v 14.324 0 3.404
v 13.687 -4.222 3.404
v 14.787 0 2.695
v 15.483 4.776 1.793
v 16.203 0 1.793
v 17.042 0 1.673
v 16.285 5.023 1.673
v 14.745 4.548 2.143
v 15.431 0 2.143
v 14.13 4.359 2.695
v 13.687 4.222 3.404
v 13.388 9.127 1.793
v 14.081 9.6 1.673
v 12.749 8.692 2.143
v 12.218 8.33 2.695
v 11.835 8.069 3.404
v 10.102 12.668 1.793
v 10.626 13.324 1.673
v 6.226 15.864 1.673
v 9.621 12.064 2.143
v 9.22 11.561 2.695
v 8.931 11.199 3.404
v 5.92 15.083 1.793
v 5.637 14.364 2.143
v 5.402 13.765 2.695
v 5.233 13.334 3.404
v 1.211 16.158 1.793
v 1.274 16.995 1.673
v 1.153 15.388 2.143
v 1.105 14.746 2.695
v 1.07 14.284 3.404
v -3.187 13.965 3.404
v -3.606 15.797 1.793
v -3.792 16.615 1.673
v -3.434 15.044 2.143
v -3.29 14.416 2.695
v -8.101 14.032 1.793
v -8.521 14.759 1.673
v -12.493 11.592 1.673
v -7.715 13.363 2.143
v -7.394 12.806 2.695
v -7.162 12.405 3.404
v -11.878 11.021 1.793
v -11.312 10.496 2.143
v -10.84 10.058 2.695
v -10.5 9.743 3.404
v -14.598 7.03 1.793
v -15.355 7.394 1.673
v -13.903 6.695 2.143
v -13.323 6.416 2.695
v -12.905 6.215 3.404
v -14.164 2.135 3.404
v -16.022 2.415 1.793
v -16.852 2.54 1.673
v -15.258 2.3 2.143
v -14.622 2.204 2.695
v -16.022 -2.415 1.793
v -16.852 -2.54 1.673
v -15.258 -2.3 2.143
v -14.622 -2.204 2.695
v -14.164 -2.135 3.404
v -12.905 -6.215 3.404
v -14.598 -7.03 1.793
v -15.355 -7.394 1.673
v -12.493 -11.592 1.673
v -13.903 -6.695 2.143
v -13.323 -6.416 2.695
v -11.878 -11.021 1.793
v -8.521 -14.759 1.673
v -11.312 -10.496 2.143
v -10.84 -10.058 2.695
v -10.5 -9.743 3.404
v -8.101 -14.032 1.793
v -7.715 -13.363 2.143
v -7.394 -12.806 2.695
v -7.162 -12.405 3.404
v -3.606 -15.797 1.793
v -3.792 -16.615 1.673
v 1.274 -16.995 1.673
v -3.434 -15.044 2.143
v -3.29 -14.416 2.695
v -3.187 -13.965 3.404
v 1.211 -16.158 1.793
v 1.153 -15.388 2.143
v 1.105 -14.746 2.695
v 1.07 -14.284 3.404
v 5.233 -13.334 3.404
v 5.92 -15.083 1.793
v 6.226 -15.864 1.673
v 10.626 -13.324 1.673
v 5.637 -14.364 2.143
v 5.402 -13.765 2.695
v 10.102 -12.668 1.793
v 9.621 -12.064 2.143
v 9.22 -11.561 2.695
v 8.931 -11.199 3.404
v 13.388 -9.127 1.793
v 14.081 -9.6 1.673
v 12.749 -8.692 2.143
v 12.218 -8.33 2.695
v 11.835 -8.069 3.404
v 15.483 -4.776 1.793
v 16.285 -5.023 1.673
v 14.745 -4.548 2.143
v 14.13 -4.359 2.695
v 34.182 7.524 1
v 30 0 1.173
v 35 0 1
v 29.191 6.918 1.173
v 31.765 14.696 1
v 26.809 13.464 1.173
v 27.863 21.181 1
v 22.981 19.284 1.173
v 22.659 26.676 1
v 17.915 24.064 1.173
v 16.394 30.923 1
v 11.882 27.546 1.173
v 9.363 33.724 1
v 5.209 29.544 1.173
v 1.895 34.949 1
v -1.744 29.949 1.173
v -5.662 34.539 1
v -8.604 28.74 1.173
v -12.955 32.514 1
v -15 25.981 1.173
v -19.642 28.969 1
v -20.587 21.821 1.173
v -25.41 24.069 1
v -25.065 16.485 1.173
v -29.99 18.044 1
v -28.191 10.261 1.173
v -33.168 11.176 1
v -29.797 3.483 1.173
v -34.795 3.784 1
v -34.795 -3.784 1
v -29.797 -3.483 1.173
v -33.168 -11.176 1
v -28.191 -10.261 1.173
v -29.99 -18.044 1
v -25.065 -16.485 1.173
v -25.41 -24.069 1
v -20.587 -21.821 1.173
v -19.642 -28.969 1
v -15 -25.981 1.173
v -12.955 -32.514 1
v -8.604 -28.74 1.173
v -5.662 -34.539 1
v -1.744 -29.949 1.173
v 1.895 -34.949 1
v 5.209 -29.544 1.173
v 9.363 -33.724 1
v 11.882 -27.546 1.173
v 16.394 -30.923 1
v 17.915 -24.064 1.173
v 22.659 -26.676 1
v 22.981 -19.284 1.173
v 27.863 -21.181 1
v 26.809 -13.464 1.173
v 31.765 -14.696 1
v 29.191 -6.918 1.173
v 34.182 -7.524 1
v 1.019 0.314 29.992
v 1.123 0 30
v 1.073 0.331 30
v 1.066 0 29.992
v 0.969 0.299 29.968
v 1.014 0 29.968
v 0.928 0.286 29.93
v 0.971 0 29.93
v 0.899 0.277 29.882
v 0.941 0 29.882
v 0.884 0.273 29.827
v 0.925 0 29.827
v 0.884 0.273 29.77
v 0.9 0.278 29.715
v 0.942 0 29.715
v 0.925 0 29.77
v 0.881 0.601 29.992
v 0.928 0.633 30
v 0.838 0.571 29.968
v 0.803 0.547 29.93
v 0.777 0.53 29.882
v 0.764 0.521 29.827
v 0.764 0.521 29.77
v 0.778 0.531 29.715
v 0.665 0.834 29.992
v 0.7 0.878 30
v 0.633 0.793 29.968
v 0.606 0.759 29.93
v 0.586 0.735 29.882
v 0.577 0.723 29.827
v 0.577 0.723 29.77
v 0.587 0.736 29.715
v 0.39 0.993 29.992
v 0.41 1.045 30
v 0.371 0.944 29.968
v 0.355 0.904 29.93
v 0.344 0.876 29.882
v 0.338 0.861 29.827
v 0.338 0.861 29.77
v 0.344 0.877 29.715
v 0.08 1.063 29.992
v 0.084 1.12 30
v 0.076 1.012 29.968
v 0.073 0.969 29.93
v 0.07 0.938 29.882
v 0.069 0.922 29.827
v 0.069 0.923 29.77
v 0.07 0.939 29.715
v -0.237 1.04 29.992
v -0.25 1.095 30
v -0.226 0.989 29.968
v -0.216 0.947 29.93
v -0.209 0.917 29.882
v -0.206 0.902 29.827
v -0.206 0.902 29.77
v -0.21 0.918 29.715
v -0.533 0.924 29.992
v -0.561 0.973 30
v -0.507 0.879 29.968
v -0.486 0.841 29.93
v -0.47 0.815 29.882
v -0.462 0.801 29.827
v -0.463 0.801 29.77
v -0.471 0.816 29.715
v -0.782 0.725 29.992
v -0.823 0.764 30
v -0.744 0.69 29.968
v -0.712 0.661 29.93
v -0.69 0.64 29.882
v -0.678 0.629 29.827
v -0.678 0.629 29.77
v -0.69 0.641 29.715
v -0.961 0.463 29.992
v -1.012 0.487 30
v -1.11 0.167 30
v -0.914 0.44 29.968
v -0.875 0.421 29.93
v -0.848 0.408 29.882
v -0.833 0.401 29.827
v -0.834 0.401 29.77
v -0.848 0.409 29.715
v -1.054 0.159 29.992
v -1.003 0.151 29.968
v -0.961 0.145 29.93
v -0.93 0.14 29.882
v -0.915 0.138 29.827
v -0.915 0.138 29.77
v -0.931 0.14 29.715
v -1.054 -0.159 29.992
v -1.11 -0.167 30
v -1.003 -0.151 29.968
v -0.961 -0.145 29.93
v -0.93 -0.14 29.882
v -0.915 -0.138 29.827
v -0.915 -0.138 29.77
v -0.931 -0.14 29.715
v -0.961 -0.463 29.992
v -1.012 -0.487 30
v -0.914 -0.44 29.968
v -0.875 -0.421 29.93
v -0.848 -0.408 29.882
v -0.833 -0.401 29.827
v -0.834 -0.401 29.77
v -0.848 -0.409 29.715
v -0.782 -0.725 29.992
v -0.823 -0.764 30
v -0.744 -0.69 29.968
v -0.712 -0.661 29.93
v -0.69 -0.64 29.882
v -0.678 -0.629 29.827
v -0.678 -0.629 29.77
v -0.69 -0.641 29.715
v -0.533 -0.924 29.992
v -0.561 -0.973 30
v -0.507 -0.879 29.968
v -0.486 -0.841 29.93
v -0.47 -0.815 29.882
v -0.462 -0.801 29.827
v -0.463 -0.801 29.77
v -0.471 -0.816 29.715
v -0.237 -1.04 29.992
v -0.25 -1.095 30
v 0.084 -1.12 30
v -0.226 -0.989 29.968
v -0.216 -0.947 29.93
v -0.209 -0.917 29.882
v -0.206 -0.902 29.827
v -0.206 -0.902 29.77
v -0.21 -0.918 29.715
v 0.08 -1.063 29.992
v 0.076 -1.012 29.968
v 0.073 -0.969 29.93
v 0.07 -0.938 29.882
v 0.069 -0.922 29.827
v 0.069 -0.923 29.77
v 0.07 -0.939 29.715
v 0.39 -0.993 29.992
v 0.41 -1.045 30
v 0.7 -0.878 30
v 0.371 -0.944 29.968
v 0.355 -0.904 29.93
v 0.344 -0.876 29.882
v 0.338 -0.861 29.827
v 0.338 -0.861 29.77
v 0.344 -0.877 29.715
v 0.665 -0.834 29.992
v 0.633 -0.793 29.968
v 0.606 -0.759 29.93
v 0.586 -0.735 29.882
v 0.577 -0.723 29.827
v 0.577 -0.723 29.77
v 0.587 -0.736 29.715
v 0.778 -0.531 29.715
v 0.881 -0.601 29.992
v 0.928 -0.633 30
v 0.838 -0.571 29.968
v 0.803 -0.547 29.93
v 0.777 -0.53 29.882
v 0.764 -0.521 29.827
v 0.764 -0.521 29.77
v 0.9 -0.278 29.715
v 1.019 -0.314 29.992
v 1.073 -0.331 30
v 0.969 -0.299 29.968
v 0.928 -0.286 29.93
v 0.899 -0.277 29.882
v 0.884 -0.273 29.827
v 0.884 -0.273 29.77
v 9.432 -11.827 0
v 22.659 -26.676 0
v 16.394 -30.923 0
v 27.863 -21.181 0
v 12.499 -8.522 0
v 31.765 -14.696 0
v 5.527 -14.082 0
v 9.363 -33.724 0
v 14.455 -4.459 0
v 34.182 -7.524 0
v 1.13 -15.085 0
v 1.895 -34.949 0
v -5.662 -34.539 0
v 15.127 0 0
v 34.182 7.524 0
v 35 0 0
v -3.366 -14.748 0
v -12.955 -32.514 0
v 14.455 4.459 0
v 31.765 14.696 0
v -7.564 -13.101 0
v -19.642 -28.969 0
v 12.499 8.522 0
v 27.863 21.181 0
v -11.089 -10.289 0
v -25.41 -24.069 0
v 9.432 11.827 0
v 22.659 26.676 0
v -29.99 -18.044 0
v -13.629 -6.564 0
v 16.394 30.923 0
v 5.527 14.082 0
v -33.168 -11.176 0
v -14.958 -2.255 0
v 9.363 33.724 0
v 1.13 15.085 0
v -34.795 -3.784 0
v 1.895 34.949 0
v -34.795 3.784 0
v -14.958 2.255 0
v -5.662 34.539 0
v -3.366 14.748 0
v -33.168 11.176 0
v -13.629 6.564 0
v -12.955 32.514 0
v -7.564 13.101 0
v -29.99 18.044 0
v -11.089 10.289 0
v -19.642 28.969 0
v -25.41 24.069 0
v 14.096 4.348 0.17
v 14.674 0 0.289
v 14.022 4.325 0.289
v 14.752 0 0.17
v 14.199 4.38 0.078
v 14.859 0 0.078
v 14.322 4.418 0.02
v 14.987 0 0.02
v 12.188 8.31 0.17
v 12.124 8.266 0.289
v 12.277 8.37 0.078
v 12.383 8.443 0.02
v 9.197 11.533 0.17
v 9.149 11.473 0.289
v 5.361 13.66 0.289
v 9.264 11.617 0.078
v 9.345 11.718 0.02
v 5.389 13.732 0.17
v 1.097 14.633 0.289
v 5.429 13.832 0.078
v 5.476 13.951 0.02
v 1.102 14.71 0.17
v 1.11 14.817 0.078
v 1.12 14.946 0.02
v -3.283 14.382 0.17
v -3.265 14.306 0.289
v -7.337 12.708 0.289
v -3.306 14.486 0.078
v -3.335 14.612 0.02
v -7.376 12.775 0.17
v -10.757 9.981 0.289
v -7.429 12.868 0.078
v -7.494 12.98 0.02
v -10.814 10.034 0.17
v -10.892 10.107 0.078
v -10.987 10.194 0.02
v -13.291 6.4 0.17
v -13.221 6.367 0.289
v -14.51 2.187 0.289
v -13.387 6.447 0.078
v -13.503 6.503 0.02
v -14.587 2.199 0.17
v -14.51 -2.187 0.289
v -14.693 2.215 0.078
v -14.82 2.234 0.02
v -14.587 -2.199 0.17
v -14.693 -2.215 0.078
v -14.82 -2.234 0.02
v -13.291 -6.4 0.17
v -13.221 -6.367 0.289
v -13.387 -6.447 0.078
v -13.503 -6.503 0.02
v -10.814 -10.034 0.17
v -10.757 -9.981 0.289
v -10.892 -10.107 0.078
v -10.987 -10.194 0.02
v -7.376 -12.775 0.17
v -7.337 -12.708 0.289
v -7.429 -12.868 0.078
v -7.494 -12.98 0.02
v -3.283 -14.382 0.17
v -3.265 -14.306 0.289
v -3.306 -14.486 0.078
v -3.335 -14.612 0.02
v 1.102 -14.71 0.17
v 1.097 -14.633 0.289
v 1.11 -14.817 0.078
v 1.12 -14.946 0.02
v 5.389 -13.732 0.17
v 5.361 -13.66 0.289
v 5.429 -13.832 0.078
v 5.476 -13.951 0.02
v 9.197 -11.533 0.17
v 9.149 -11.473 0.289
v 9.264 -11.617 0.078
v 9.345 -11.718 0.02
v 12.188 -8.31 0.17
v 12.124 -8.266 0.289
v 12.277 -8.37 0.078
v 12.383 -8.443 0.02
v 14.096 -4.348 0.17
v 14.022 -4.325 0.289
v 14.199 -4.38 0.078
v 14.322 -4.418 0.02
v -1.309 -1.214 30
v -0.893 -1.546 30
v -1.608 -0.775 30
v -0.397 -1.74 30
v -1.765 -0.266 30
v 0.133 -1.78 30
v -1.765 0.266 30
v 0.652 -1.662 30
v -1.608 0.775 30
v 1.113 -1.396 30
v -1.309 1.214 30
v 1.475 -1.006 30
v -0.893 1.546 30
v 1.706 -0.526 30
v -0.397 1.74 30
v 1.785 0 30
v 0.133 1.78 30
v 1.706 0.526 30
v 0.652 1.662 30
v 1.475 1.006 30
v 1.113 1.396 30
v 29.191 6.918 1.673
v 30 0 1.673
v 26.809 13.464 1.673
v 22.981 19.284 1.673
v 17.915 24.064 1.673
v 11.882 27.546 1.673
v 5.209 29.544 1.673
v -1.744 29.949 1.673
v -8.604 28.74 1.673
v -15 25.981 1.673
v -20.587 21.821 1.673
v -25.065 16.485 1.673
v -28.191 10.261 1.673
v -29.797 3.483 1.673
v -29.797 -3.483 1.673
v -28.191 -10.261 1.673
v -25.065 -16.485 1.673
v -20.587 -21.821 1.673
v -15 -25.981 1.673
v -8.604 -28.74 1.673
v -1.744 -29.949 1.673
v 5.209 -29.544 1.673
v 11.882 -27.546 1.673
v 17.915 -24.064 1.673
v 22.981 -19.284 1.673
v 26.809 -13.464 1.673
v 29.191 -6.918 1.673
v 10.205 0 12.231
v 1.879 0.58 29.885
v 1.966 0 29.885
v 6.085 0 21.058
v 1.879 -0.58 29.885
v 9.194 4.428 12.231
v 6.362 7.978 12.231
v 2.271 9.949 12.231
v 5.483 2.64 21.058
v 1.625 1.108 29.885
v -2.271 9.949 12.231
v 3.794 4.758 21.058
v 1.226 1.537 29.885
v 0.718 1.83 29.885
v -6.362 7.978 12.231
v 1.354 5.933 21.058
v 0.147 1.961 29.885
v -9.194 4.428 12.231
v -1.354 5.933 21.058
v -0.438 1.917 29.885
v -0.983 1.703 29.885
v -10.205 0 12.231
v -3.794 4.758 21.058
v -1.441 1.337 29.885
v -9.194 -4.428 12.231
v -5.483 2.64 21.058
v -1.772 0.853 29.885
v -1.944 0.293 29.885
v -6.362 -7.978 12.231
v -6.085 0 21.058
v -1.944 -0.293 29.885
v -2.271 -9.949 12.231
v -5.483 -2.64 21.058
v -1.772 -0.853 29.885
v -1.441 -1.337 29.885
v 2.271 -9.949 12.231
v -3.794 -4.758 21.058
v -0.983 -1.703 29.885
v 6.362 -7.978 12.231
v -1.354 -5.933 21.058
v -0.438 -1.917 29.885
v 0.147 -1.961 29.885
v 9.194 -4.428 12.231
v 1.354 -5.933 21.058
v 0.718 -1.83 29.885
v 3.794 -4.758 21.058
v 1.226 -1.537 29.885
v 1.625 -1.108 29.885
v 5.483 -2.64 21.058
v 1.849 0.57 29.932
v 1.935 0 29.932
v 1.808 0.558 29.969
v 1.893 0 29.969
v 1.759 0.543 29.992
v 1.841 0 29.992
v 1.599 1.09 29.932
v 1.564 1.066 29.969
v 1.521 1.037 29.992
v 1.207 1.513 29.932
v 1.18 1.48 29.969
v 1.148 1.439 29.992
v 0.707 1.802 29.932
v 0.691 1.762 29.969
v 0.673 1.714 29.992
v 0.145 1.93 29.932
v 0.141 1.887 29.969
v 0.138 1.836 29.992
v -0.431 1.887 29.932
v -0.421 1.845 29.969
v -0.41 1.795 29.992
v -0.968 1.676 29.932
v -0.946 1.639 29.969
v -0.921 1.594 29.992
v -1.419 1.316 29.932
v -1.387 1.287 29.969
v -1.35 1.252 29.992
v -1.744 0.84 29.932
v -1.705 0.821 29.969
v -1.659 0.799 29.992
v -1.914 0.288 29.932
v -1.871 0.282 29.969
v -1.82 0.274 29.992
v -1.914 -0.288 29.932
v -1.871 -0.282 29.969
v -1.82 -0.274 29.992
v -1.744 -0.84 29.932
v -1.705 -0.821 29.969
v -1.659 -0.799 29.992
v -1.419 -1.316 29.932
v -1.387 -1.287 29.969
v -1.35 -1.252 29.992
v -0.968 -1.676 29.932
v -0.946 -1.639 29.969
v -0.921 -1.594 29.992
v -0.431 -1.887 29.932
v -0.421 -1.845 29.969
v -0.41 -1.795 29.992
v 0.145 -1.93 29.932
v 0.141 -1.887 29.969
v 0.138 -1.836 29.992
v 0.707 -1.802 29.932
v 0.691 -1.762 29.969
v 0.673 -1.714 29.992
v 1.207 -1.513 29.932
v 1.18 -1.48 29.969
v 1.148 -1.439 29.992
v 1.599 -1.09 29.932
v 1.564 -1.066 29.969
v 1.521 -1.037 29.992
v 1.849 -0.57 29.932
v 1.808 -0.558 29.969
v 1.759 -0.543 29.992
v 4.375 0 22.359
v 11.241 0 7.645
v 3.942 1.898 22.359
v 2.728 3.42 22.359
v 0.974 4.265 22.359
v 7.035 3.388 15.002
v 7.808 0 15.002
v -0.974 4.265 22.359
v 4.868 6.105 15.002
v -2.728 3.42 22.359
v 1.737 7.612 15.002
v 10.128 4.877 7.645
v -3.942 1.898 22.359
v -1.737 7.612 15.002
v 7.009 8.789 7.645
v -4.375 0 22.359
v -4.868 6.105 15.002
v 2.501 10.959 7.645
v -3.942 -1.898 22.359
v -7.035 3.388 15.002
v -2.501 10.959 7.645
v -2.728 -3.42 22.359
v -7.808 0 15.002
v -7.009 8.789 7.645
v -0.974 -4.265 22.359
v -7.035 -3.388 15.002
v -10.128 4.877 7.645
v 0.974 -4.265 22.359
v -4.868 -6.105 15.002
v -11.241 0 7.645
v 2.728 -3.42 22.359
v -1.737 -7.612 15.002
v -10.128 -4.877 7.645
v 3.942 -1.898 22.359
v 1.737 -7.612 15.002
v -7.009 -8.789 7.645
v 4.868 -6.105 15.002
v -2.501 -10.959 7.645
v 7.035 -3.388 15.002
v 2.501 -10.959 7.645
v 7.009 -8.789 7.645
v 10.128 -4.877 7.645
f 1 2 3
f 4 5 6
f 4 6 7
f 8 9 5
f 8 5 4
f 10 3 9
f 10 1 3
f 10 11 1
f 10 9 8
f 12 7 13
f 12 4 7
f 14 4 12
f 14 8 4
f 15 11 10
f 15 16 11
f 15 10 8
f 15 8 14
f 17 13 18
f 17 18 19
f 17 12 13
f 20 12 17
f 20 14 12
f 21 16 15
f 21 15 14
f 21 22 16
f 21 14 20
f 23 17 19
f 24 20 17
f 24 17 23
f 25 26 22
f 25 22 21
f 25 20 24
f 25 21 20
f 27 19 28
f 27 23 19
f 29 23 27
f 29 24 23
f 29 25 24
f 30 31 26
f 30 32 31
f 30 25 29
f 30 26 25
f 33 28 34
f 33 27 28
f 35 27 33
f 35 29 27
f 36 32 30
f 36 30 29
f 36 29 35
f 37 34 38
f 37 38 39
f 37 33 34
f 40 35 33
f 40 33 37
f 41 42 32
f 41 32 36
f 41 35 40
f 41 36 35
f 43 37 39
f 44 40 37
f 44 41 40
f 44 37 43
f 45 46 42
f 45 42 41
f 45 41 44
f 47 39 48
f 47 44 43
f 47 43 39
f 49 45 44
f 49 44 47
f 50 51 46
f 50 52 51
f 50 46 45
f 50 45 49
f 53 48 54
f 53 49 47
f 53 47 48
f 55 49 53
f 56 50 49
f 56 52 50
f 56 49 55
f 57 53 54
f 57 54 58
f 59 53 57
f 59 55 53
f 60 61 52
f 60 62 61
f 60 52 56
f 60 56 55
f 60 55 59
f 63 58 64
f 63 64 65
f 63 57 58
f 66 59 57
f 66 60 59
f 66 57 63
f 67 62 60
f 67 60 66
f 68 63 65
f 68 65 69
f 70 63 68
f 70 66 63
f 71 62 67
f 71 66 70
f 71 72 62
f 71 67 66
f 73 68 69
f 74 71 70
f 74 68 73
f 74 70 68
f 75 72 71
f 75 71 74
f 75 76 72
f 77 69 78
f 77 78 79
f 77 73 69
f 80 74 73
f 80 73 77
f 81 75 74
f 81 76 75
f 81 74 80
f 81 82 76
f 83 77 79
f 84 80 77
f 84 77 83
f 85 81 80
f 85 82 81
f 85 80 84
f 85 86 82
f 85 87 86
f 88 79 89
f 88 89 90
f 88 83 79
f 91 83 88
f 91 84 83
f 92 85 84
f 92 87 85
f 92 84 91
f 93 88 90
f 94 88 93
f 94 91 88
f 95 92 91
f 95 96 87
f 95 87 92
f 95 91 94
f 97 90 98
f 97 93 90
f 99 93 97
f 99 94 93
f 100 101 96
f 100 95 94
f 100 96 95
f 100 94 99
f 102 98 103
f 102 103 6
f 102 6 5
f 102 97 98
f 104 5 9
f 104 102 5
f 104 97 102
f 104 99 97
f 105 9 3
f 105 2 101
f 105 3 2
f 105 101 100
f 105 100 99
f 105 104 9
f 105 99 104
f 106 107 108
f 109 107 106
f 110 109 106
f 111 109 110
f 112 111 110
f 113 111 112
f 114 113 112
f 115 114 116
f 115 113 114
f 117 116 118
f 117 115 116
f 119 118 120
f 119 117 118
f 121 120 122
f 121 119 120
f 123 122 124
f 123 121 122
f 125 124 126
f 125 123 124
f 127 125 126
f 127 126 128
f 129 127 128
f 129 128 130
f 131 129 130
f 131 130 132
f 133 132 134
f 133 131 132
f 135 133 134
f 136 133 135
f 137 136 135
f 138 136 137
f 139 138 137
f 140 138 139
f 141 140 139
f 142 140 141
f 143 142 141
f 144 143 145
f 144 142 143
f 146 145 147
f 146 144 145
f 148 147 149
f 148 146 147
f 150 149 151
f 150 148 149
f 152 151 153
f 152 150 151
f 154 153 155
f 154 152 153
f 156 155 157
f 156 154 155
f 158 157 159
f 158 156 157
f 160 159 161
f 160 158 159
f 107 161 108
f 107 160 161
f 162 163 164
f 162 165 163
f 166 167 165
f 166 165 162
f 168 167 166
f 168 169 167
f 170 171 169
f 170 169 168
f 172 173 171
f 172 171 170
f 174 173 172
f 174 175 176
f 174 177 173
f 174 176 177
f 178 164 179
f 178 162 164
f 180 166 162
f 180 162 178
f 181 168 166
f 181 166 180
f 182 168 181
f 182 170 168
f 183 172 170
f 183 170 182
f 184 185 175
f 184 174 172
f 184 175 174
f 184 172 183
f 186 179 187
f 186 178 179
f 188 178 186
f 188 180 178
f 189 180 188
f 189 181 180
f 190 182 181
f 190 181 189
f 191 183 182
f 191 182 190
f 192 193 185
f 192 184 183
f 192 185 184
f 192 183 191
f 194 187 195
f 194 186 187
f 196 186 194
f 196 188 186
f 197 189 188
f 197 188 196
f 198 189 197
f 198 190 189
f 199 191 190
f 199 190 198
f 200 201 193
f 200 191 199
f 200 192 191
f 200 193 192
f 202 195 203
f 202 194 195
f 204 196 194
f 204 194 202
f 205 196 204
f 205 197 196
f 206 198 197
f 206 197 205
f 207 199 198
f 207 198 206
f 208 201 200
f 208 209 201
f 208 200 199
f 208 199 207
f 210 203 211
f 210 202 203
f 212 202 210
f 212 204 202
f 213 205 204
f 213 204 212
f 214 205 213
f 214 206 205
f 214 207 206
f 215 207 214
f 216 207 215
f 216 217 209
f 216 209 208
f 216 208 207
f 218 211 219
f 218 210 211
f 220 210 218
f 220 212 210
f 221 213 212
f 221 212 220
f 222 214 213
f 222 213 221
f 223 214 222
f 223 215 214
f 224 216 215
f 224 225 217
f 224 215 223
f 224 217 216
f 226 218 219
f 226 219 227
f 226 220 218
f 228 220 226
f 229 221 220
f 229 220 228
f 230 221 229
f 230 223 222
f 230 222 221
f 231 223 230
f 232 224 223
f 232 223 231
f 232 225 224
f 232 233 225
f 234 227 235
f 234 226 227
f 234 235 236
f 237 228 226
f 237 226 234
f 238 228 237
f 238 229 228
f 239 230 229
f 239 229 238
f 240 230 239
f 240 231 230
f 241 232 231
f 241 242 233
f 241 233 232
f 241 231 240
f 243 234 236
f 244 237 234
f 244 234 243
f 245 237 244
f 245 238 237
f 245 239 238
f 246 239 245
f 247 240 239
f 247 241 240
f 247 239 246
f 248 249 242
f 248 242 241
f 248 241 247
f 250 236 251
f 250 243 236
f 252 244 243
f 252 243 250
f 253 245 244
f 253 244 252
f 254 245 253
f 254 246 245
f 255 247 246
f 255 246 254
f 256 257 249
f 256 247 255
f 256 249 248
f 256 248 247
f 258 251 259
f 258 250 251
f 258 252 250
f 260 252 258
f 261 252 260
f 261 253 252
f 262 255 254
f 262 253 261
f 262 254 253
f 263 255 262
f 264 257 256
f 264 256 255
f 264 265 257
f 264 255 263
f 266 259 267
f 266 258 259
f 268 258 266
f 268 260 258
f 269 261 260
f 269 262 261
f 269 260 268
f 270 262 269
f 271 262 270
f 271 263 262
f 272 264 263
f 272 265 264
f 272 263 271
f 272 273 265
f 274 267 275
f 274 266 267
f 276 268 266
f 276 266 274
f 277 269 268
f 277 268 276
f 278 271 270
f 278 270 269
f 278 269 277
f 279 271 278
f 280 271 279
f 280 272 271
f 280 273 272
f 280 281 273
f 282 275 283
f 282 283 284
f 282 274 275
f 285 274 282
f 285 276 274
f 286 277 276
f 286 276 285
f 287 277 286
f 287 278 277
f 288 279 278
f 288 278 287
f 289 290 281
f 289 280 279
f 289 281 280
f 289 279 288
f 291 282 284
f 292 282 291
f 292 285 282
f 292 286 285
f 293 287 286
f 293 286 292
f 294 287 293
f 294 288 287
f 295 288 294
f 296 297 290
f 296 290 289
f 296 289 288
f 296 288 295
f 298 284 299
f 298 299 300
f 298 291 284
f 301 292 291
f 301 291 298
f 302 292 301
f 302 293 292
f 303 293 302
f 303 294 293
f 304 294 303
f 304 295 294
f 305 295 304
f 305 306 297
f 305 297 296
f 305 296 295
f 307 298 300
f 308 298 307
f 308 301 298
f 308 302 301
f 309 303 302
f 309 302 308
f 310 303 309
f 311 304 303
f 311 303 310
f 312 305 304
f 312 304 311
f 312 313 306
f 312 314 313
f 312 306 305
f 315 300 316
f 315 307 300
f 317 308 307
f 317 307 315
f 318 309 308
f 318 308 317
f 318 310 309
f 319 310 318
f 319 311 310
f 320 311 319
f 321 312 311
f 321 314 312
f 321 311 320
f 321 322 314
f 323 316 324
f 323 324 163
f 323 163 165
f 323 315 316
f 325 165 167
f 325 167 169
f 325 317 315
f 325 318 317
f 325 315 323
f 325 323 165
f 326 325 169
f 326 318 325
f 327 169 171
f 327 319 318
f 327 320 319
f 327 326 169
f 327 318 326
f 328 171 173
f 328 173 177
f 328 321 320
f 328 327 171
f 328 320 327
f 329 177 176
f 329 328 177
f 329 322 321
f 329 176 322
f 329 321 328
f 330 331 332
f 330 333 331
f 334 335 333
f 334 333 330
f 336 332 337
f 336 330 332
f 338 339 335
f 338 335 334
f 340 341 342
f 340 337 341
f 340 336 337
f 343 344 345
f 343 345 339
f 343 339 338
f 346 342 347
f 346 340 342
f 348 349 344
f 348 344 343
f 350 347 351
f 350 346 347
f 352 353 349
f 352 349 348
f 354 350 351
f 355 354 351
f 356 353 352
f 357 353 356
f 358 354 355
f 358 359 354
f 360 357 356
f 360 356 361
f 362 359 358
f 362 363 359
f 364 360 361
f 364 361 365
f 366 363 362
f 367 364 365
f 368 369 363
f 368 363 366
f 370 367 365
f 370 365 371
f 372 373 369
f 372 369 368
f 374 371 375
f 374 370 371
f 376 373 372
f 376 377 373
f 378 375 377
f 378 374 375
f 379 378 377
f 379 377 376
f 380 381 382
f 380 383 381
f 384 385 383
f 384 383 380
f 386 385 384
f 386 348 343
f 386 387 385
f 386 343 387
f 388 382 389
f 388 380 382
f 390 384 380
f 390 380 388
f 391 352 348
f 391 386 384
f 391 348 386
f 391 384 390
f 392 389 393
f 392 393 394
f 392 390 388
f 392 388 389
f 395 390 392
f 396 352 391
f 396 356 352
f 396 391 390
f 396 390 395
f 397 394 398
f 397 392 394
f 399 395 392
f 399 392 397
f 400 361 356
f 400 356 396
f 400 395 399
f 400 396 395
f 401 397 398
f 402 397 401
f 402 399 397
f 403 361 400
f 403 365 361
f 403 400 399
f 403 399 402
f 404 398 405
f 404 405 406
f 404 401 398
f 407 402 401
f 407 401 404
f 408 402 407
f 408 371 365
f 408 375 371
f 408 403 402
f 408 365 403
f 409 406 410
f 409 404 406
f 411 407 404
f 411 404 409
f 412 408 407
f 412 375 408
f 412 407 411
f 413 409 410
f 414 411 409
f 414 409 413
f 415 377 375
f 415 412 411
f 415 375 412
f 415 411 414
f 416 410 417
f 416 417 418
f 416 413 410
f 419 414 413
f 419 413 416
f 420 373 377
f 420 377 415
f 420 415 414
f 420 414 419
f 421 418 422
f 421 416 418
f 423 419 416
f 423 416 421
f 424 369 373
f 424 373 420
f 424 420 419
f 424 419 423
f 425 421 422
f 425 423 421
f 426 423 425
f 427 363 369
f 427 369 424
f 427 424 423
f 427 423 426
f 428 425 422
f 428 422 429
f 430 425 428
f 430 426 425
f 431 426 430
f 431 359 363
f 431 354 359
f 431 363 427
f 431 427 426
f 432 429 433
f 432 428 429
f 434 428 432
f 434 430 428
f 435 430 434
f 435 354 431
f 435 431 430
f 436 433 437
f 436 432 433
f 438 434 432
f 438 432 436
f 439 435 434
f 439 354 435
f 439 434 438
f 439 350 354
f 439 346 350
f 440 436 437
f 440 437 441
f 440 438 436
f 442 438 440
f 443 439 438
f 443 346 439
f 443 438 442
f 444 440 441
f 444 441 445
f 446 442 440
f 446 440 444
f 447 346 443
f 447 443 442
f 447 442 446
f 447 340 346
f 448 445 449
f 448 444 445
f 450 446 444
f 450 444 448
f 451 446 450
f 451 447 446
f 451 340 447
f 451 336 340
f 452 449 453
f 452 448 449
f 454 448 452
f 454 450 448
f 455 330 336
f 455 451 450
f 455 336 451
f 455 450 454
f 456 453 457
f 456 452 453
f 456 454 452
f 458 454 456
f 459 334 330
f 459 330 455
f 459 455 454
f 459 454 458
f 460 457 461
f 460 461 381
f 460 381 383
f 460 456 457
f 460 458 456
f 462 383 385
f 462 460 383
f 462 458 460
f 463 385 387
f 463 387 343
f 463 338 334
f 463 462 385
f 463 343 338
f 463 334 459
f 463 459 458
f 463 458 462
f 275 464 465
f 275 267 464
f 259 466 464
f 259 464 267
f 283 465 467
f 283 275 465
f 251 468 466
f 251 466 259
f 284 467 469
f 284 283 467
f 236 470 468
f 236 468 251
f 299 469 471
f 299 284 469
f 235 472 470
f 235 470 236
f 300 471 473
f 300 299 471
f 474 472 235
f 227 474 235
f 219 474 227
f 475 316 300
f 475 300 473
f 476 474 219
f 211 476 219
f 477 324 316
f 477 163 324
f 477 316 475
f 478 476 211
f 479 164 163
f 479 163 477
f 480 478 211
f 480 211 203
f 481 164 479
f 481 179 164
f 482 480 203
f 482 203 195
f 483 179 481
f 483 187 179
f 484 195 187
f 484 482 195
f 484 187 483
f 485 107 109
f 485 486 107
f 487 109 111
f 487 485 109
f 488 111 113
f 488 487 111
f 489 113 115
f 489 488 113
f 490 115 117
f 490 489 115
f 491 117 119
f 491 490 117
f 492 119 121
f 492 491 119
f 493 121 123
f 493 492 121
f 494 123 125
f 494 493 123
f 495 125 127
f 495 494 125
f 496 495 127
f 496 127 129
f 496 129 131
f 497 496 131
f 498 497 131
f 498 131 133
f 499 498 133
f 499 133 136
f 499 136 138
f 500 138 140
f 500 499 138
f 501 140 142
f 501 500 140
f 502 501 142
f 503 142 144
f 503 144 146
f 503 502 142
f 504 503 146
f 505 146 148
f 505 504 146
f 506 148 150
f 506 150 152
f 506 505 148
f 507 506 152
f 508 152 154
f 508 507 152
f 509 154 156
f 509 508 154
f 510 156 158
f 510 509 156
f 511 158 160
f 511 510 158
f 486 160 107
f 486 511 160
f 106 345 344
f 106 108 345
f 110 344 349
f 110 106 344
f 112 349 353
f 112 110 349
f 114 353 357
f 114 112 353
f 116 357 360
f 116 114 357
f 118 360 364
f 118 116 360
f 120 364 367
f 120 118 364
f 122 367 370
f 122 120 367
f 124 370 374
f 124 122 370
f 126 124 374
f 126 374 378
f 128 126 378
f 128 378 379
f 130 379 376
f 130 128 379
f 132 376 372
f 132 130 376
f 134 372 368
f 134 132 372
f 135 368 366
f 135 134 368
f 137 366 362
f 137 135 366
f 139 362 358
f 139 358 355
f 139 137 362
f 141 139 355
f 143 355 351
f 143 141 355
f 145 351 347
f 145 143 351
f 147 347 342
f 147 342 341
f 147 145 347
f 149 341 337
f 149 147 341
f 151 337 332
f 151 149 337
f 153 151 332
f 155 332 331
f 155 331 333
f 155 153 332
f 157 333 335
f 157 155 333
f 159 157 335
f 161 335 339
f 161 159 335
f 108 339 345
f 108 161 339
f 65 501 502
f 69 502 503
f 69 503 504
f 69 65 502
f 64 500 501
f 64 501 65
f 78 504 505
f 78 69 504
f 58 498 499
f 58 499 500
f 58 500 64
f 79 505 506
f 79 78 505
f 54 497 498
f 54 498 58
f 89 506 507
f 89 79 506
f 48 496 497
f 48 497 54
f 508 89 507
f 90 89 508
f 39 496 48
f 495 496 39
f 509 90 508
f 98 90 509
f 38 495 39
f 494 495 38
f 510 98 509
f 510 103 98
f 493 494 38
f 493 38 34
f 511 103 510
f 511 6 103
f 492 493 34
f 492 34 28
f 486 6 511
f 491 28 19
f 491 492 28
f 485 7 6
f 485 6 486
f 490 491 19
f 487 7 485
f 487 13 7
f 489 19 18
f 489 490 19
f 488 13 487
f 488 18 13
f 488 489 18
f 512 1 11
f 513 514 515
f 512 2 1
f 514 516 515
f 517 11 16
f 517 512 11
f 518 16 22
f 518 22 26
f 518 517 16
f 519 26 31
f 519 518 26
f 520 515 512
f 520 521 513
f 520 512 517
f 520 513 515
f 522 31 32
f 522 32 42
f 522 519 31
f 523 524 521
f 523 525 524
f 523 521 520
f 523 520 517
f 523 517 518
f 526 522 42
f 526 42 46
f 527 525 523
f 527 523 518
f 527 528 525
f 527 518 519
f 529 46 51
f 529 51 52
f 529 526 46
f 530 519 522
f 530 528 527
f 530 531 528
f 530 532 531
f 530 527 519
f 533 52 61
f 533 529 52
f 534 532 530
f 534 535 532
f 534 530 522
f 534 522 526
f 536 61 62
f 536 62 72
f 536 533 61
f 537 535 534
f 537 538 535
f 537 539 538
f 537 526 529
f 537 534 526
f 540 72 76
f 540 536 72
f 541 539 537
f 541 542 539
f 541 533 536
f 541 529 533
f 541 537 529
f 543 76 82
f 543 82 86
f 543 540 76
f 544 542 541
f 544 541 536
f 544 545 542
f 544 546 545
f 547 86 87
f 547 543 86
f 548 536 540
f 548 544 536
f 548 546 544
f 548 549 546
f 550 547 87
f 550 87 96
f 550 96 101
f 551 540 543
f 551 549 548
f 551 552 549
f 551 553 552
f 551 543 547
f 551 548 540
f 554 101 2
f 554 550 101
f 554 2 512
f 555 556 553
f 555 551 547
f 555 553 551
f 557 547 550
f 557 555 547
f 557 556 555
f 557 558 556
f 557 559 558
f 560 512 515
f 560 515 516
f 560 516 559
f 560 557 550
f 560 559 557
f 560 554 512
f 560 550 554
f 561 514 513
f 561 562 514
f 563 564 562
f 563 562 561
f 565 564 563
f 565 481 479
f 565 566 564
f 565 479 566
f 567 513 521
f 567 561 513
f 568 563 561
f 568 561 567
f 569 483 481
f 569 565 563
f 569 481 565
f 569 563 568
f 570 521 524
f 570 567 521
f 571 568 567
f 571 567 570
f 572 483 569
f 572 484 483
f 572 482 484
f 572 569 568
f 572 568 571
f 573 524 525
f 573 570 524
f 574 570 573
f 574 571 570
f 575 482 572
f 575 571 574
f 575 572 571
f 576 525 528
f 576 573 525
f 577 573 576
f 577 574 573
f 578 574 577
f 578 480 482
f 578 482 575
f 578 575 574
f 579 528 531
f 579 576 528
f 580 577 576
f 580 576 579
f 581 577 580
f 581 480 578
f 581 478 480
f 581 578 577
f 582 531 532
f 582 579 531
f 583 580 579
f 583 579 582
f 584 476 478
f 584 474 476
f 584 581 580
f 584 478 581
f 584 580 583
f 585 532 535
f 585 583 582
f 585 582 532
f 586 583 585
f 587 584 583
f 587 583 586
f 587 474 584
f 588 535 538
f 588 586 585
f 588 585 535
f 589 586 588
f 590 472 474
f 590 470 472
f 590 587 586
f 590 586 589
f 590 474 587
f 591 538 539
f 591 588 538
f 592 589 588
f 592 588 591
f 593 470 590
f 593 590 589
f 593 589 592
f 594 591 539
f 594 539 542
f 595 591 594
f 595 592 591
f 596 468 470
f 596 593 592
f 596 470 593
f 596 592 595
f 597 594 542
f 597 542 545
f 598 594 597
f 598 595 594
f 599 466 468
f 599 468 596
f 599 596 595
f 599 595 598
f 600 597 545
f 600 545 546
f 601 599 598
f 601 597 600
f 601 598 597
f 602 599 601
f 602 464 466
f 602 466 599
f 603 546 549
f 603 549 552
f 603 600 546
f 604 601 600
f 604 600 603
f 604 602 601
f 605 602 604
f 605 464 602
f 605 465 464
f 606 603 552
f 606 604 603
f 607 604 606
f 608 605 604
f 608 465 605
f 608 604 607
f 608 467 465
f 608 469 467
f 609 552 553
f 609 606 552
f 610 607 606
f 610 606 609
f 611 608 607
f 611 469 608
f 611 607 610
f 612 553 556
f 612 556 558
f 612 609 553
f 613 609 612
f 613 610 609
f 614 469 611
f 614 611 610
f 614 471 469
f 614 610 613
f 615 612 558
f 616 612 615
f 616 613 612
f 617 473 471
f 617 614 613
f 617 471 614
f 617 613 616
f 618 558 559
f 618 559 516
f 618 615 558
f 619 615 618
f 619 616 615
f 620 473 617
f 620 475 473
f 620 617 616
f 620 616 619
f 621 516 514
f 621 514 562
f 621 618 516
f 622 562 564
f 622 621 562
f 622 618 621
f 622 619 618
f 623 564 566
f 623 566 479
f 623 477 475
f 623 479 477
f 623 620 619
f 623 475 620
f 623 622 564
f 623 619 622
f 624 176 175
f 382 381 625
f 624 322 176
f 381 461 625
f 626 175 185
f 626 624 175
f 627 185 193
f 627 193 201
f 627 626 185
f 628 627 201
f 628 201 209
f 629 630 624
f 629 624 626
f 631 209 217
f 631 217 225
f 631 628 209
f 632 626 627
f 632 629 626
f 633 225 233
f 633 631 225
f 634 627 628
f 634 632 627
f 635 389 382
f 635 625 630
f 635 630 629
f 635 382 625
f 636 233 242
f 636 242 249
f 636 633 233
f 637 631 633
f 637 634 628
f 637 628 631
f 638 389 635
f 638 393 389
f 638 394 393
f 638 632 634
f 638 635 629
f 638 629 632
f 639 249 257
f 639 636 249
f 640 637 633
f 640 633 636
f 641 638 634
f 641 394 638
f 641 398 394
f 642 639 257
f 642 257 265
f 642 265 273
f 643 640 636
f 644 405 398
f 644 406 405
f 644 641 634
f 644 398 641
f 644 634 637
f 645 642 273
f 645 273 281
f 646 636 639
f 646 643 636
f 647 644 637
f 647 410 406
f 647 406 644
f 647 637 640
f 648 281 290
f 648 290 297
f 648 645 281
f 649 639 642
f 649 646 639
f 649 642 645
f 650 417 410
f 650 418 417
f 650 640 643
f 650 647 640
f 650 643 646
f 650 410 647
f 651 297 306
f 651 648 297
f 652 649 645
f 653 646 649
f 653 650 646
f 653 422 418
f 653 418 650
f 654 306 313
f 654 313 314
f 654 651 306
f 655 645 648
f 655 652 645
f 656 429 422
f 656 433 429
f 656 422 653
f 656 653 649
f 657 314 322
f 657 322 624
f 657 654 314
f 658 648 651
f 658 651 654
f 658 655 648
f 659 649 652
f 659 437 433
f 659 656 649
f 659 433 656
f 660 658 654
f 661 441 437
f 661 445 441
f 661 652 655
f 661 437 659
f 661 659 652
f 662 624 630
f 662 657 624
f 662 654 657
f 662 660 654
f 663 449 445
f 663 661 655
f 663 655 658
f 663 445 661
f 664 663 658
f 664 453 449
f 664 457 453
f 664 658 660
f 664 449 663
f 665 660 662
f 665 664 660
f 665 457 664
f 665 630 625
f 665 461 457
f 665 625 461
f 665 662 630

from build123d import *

# Parameters (mm, degrees)
F2_R = 3


with BuildPart() as f1:
    # F0 (on Front) → F1 (revolve)
    with BuildSketch(Plane.XZ):
        with BuildLine():
            ThreePointArc((14.674281, 0.288557), (14.858785, 0.078265), (15.127373, 0))
            Line((15.127373, 0), (35, 0))
            Line((35, 0), (35, 1))
            Line((35, 1), (30, 1.173134))
            Line((30, 1.173134), (30, 1.673134))
            Line((30, 1.673134), (15.131675, 1.673134))
            Line((15.131675, 1.673134), (1.966335, 29.884577))
            ThreePointArc((1.966335, 29.884577), (1.892533, 29.968694), (1.785098, 30))
            Line((1.785098, 30), (1.12298, 30))
            ThreePointArc((1.12298, 30), (0.954286, 29.907435), (0.941744, 29.715423))
            Line((0.941744, 29.715423), (14.674281, 0.288557))
        make_face()
    revolve(axis=Axis((0, 0, 16.256472), (0, 0, 1)))

    # F2
    f2_edges = [f1.edges().sort_by_distance(p)[0] for p in [
        (-15.131675, 0, 1.673134),
    ]]
    fillet(f2_edges, radius=F2_R)


solid = f1.part
